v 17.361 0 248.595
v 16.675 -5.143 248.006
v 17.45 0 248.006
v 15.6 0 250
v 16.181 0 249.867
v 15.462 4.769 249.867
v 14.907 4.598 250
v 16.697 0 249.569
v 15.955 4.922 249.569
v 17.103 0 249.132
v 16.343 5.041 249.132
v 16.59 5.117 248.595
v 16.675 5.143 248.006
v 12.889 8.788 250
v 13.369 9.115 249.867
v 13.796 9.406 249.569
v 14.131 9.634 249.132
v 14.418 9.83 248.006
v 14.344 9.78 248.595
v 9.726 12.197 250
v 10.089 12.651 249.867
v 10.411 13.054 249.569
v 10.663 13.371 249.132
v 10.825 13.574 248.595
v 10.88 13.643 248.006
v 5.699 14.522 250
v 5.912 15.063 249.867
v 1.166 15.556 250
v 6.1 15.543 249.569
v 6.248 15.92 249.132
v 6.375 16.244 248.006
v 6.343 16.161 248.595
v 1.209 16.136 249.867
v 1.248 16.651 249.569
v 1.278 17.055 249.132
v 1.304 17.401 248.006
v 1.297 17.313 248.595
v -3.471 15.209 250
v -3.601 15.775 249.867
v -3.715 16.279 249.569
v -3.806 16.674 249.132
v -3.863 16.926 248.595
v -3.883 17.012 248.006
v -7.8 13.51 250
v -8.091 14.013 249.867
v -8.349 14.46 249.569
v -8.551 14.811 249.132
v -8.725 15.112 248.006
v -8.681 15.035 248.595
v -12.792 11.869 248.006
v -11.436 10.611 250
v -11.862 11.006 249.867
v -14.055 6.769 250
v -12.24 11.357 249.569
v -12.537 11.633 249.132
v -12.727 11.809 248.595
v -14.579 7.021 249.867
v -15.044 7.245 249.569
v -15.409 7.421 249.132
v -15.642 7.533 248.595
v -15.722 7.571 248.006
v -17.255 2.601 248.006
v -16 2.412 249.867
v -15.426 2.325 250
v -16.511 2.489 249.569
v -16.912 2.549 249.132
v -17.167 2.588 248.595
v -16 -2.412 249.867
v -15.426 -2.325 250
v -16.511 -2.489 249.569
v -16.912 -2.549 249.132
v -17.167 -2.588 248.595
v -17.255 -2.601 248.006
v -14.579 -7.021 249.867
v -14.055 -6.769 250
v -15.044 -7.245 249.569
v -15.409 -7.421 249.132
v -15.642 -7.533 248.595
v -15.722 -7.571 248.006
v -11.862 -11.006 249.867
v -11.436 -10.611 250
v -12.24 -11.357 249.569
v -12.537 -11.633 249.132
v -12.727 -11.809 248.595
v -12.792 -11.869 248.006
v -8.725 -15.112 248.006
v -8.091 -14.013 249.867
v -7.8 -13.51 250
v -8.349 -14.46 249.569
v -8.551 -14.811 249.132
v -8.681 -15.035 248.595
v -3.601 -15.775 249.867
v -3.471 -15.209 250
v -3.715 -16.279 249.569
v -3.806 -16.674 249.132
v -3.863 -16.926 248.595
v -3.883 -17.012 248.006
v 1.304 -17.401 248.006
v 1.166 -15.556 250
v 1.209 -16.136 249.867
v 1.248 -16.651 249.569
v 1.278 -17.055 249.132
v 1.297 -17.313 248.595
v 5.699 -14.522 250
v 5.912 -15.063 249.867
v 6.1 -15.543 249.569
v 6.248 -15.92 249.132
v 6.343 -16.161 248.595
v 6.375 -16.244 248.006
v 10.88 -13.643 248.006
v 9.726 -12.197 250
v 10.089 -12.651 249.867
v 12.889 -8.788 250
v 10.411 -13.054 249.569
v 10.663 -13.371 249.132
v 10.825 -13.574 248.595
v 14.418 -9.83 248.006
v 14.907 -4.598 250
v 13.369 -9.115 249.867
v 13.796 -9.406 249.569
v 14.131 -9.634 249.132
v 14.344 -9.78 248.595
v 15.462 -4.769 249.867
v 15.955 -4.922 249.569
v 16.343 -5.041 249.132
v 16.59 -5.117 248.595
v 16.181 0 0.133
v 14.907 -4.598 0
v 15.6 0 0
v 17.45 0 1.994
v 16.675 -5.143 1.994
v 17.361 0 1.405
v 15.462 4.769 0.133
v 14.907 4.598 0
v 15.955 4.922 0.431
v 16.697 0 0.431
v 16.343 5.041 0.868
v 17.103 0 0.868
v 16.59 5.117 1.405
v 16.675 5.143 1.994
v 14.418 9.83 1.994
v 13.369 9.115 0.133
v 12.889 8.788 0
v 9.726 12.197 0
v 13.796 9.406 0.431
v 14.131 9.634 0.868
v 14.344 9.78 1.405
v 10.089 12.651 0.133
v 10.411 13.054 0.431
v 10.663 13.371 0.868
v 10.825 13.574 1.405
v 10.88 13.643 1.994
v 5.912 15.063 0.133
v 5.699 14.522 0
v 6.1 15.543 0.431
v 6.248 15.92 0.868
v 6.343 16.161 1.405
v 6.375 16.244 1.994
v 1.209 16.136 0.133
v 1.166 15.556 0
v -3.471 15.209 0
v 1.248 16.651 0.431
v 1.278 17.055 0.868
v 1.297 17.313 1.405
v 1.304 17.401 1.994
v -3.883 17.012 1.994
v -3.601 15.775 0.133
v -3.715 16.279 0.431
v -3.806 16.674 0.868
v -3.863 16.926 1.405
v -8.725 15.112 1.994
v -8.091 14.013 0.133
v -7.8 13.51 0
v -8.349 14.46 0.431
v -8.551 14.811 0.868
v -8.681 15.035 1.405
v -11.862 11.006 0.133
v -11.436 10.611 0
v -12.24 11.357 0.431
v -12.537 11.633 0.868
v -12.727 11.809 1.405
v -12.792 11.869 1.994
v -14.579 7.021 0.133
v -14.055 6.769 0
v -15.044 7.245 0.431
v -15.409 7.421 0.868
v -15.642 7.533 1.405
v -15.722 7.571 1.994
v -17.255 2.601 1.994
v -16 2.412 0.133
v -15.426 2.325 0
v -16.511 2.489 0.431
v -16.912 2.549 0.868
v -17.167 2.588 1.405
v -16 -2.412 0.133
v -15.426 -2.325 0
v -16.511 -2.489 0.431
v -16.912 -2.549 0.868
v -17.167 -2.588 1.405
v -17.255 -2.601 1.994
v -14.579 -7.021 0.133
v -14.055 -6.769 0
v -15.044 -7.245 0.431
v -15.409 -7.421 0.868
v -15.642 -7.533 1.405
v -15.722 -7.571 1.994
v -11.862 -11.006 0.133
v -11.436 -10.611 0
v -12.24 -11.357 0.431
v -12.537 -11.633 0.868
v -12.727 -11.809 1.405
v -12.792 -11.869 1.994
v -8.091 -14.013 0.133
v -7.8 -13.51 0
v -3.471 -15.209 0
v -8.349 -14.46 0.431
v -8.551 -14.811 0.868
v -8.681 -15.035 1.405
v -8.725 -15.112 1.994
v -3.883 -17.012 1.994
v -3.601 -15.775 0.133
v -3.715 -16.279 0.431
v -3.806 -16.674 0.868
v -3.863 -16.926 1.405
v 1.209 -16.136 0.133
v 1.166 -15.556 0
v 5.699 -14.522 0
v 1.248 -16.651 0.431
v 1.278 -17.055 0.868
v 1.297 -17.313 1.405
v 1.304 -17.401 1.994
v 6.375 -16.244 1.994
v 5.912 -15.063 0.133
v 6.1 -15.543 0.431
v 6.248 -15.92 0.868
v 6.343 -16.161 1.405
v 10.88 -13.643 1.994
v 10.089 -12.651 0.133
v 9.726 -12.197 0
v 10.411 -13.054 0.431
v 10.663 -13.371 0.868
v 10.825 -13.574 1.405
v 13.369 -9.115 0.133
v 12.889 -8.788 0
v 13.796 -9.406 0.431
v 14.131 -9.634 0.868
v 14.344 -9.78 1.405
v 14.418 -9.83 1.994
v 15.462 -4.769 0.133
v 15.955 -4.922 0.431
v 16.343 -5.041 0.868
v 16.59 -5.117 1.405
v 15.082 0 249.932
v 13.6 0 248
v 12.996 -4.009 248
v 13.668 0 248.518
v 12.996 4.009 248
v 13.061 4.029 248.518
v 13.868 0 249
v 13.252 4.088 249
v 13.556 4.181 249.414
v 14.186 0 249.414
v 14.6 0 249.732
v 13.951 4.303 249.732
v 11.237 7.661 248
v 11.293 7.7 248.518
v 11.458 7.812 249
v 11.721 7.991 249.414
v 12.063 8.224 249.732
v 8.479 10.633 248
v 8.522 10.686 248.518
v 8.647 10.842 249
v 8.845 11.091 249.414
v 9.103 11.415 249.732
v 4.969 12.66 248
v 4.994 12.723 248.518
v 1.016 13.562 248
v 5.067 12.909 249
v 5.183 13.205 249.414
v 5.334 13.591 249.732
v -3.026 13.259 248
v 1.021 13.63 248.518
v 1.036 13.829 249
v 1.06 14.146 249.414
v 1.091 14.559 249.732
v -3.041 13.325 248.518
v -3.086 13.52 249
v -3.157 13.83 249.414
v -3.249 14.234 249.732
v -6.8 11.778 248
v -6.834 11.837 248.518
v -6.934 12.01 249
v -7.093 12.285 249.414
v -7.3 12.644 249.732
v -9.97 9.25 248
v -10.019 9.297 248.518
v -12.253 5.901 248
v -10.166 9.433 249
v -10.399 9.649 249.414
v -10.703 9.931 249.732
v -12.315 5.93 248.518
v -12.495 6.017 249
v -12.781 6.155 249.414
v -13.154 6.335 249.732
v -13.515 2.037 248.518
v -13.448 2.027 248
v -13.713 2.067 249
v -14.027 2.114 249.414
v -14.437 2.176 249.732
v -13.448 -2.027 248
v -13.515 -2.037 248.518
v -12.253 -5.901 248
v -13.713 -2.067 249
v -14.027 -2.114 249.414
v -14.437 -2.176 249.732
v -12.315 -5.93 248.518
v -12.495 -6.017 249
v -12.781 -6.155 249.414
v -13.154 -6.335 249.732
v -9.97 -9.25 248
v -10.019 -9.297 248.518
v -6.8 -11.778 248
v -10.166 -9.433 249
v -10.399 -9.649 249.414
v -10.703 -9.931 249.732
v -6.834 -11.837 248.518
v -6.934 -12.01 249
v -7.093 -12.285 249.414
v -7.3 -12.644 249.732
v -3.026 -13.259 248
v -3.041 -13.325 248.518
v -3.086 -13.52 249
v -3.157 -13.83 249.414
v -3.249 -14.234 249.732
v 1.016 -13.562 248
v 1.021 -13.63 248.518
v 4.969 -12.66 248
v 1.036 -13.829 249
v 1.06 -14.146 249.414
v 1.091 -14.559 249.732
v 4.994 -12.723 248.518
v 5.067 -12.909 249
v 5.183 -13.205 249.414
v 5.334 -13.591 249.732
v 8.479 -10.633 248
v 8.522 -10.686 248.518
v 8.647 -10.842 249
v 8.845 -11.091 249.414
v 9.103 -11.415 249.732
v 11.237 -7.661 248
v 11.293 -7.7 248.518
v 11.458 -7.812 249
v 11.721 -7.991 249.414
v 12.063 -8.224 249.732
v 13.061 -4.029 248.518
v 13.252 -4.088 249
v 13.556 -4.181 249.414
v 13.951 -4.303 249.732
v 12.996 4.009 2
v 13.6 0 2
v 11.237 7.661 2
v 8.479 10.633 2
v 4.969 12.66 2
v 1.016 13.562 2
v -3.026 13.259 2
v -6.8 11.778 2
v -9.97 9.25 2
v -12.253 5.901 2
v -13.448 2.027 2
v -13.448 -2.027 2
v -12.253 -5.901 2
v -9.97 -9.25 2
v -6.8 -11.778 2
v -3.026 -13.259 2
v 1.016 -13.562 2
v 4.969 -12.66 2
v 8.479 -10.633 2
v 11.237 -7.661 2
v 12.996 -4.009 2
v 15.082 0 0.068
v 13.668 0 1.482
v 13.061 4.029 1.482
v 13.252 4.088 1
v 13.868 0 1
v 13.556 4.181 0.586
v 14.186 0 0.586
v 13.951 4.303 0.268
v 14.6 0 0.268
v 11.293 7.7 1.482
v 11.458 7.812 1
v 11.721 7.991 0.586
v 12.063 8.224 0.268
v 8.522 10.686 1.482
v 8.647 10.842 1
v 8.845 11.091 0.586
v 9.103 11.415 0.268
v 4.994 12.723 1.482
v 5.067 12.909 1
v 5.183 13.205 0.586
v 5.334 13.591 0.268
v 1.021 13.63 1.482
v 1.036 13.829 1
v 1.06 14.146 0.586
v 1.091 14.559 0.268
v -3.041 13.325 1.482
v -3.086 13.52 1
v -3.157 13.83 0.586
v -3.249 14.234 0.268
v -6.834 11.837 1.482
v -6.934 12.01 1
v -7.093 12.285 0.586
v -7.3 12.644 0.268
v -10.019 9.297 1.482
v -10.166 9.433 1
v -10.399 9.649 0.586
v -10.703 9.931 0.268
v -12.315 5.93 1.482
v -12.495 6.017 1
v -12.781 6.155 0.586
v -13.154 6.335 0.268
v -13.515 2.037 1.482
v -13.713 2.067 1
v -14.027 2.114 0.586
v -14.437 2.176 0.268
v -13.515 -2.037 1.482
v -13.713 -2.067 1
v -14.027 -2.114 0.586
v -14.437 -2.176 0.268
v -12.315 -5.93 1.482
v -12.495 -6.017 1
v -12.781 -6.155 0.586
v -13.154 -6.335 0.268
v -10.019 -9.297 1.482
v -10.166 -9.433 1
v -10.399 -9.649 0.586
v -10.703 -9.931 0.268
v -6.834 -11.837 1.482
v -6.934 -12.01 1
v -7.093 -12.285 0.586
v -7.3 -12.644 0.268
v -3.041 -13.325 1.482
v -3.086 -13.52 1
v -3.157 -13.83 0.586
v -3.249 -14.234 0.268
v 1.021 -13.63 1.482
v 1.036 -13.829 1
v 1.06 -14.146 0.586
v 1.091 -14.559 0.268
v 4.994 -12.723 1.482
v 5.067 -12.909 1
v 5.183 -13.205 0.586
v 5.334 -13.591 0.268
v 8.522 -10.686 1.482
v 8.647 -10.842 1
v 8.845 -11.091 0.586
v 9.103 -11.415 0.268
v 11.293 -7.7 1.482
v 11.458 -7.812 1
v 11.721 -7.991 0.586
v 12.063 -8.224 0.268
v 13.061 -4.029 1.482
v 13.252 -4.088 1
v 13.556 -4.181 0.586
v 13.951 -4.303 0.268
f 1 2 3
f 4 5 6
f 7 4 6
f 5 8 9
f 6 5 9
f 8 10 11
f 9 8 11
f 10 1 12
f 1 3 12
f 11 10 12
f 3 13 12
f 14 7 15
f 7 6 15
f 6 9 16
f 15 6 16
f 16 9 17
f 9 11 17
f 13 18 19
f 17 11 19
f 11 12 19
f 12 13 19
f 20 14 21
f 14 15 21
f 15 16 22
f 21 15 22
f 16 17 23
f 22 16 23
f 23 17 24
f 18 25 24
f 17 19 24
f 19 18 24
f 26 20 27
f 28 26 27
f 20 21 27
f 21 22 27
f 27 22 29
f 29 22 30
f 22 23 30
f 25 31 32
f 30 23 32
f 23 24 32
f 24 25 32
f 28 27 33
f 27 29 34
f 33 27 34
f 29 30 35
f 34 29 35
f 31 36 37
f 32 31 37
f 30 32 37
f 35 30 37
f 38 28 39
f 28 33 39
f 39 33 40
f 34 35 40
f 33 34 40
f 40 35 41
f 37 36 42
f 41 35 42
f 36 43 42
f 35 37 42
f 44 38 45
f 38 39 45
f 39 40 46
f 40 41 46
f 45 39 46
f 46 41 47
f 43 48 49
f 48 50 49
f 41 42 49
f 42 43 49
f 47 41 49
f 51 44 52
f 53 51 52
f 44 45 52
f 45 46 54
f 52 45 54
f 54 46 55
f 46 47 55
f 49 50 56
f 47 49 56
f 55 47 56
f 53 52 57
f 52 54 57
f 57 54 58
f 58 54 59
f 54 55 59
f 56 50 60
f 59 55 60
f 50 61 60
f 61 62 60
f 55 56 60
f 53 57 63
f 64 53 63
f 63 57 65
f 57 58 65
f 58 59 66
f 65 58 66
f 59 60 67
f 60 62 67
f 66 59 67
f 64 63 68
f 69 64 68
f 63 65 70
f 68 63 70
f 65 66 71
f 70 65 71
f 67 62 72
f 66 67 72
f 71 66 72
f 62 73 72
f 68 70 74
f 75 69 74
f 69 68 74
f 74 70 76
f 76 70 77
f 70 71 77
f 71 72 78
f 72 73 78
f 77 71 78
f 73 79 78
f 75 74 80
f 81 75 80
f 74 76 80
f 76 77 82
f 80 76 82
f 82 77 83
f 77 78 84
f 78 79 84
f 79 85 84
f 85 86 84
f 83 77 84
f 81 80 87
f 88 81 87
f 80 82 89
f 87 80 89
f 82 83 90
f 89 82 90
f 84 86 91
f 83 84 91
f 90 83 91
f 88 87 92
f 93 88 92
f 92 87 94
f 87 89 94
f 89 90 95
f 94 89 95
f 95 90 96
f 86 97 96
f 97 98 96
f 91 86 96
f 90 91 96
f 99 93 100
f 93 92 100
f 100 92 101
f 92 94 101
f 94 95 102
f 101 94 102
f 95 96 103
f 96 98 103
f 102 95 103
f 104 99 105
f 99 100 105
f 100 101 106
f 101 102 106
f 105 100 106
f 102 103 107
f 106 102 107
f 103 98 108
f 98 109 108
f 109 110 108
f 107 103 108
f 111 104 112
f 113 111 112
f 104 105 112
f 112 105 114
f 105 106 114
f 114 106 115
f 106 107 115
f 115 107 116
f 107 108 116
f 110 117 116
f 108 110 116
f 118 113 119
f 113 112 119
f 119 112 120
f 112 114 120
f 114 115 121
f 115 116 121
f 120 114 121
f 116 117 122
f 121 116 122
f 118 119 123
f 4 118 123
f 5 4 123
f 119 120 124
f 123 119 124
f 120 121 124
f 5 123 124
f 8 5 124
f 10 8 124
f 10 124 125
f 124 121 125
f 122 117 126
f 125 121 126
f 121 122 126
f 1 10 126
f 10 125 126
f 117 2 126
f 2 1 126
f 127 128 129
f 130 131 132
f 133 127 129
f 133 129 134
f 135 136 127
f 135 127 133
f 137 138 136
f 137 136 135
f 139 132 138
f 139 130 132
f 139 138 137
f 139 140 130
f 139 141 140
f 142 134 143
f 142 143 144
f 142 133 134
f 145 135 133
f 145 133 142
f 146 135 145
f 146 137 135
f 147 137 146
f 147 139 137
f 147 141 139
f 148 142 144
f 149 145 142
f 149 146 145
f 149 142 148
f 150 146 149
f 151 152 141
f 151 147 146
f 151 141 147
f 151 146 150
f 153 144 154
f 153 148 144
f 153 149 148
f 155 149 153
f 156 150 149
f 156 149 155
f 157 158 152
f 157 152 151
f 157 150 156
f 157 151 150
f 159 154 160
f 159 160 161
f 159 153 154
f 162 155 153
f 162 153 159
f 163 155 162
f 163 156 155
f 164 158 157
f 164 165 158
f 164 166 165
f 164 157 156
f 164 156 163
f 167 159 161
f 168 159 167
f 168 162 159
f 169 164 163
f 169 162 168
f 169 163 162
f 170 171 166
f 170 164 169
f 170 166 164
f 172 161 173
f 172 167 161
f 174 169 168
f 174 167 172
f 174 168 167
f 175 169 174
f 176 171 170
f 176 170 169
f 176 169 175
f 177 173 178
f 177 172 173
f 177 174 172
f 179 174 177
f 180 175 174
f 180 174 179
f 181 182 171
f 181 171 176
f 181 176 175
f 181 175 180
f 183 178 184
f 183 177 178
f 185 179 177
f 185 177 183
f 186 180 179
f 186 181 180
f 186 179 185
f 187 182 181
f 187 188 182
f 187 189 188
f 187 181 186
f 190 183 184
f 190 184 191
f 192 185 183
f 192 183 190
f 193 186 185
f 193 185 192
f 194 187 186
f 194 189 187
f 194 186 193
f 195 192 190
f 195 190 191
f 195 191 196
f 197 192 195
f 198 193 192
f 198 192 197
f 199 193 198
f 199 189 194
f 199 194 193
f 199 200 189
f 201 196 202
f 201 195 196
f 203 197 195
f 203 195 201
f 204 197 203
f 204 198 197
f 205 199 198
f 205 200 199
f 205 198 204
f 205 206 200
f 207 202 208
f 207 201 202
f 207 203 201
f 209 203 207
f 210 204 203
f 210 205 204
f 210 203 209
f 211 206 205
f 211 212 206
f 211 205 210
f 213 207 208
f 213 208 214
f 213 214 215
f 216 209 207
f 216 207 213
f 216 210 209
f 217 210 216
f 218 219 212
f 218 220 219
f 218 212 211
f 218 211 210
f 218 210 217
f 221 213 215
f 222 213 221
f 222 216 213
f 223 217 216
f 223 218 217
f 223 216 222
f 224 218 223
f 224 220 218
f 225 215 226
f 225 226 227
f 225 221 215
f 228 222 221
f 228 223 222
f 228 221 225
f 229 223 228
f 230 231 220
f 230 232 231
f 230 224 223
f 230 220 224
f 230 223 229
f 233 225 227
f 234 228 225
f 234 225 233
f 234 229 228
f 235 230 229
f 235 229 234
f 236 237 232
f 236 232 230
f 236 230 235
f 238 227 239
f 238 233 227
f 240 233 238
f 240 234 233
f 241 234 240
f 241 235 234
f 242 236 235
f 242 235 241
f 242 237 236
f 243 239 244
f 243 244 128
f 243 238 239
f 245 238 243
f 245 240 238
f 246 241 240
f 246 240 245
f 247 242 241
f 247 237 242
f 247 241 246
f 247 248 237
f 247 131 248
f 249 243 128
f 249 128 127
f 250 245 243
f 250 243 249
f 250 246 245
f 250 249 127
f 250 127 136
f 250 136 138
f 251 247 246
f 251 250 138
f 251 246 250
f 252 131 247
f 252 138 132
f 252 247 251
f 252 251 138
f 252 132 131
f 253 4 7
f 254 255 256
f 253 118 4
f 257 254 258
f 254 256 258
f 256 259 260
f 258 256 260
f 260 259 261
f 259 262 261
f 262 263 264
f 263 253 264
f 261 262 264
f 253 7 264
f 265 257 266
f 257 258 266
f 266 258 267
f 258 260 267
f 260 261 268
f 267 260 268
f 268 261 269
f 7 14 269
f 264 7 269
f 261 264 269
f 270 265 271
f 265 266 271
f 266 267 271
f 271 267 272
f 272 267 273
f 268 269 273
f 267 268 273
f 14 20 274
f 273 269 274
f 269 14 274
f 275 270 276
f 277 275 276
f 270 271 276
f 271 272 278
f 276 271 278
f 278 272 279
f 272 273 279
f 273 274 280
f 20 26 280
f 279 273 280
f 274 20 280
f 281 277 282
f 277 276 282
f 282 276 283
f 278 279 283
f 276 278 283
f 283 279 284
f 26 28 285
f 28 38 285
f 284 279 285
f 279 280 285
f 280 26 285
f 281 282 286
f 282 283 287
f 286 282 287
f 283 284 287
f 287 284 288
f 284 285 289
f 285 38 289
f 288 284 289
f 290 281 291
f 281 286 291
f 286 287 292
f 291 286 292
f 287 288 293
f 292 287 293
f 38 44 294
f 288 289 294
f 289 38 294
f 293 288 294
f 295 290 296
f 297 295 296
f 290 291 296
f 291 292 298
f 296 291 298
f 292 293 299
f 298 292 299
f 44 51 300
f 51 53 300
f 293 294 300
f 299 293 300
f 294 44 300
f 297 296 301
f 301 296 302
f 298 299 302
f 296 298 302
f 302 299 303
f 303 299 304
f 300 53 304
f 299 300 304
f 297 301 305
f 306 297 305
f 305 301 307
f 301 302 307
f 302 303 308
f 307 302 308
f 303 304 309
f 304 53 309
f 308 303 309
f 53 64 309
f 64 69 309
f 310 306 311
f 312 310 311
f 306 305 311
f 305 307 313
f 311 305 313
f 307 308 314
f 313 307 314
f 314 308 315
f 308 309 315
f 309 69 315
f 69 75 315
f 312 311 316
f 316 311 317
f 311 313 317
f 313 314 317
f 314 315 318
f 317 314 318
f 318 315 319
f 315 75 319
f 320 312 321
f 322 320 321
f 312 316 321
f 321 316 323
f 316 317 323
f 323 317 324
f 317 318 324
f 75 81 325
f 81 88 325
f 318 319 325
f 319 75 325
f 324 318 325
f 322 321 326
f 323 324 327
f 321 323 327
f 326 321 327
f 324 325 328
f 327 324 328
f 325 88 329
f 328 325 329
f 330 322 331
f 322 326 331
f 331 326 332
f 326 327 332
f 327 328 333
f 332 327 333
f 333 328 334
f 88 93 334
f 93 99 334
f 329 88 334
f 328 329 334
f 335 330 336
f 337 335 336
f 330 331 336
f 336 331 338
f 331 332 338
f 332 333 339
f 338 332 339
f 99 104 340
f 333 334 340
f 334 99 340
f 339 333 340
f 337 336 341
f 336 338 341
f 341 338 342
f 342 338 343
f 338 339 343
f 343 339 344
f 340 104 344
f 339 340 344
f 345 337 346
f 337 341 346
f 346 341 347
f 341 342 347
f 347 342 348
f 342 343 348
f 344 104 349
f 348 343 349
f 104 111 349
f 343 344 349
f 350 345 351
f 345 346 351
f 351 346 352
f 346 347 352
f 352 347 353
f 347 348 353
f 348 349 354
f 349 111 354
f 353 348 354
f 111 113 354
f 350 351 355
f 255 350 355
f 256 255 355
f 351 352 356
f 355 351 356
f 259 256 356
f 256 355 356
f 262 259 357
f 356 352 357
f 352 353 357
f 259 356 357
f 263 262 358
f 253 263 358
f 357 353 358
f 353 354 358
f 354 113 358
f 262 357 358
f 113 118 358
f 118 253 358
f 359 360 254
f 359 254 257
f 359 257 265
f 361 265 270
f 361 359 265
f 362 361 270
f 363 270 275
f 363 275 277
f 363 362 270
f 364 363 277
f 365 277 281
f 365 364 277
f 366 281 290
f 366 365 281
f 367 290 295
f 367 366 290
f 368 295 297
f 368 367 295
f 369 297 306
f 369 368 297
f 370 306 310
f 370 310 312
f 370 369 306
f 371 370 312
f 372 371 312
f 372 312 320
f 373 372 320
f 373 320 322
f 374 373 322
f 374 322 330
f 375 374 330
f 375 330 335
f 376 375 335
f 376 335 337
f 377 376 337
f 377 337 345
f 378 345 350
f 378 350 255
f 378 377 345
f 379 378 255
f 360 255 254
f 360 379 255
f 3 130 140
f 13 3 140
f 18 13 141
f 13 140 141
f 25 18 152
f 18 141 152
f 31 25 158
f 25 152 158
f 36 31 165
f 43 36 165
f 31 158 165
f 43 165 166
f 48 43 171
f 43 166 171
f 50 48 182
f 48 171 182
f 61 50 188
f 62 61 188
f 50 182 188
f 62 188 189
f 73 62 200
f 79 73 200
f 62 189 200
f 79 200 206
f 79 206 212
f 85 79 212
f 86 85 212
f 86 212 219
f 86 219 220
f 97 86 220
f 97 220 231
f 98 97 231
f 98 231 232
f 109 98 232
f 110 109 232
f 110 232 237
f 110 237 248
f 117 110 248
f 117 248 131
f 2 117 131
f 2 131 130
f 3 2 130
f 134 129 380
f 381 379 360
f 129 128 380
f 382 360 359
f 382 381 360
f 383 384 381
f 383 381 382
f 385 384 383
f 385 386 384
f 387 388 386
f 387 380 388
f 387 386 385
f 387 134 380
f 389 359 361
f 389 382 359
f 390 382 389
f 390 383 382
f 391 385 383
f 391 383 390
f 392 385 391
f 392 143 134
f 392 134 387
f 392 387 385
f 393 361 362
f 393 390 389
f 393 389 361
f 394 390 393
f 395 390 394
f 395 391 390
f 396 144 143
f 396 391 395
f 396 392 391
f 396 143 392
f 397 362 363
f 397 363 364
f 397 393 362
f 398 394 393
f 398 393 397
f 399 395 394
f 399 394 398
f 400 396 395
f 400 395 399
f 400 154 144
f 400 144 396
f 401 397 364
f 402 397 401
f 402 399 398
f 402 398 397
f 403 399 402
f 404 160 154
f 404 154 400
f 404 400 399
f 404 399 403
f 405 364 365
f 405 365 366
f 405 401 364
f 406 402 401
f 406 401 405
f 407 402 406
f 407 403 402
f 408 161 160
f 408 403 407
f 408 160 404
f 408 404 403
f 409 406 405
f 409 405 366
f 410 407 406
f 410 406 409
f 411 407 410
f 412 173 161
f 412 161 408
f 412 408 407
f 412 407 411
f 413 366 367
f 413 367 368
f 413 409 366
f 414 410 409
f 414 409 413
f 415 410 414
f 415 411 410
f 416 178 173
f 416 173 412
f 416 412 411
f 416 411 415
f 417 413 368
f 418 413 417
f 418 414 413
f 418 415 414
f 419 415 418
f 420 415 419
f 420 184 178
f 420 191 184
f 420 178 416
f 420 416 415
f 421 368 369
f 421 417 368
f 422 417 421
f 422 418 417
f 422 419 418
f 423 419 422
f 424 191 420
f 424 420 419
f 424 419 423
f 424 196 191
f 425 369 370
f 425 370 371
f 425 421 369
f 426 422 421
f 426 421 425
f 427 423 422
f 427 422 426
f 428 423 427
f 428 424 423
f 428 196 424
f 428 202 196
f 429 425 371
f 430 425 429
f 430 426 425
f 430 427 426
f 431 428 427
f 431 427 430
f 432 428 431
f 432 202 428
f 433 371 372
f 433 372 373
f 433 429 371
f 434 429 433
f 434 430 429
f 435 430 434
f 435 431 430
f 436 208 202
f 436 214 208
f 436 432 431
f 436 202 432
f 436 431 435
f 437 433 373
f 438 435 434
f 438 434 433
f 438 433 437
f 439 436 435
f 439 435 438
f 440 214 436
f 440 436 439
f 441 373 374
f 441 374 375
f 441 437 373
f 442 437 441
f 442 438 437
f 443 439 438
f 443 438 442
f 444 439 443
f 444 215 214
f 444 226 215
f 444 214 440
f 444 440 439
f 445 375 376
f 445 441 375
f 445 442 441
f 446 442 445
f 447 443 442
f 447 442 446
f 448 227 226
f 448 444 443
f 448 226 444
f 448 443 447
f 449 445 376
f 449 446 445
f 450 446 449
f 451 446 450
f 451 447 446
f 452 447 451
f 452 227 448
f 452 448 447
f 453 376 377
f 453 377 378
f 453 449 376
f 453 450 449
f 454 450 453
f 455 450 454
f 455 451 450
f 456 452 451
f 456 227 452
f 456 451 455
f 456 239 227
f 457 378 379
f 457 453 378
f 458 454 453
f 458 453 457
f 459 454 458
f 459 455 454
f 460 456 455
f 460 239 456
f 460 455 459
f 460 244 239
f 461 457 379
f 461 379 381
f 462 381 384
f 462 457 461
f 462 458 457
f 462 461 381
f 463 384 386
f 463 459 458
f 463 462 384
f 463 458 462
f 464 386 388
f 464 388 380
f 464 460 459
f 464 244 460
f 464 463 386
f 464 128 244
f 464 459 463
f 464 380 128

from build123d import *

# Parameters (mm, degrees)
F0_R     = 17.45
F0_R_2   = 13.6
F1_DEPTH = 250
F2_R     = 2
F4_R     = 2


# Not quite as in the source:
# - a fillet or chamfer that OpenCascade refuses, or shapes differently, is made with other operations: its cross-section is extruded or revolved along the edge and cut away or added


with BuildPart() as f1:
    # F0 (on Top) → F1 (new body)
    with BuildSketch(Plane.XY):
        Circle(F0_R)
        Circle(F0_R_2, mode=Mode.SUBTRACT)
    extrude(amount=F1_DEPTH)

    # F2
    f2_edges = [f1.edges().sort_by_distance(p)[0] for p in [
        (-13.6, 0, 250),
    ]]
    fillet(f2_edges, radius=F2_R)

    # F3: fillet of radius 2 on 1 edges, made by hand

    # F3_s1 → F3_t2 (revolve, cut)
    with BuildSketch(Plane.XZ):
        with BuildLine():
            ThreePointArc((15.6, 250), (16.9162878299, 249.3657799834), (17.45, 248.0056329325))
            Line((17.45, 248.0056329325), (17.45, 250))
            Line((17.45, 250), (15.6, 250))
        make_face()
    revolve(axis=Axis((0, 0, 250), (0, 0, 1)), mode=Mode.SUBTRACT)

    # F4
    f4_edges = [f1.edges().sort_by_distance(p)[0] for p in [
        (-13.6, 0, 0),
    ]]
    fillet(f4_edges, radius=F4_R)

    # F5: fillet of radius 2 on 1 edges, made by hand

    # F5_s1 → F5_t2 (revolve, cut)
    with BuildSketch(Plane.XZ):
        with BuildLine():
            ThreePointArc((15.6, 0), (16.9162878299, 0.6342200166), (17.45, 1.9943670675))
            Line((17.45, 1.9943670675), (17.45, 0))
            Line((17.45, 0), (15.6, 0))
        make_face()
    revolve(axis=Axis((0, 0, 0), (0, 0, 1)), mode=Mode.SUBTRACT)


solid = f1.part
